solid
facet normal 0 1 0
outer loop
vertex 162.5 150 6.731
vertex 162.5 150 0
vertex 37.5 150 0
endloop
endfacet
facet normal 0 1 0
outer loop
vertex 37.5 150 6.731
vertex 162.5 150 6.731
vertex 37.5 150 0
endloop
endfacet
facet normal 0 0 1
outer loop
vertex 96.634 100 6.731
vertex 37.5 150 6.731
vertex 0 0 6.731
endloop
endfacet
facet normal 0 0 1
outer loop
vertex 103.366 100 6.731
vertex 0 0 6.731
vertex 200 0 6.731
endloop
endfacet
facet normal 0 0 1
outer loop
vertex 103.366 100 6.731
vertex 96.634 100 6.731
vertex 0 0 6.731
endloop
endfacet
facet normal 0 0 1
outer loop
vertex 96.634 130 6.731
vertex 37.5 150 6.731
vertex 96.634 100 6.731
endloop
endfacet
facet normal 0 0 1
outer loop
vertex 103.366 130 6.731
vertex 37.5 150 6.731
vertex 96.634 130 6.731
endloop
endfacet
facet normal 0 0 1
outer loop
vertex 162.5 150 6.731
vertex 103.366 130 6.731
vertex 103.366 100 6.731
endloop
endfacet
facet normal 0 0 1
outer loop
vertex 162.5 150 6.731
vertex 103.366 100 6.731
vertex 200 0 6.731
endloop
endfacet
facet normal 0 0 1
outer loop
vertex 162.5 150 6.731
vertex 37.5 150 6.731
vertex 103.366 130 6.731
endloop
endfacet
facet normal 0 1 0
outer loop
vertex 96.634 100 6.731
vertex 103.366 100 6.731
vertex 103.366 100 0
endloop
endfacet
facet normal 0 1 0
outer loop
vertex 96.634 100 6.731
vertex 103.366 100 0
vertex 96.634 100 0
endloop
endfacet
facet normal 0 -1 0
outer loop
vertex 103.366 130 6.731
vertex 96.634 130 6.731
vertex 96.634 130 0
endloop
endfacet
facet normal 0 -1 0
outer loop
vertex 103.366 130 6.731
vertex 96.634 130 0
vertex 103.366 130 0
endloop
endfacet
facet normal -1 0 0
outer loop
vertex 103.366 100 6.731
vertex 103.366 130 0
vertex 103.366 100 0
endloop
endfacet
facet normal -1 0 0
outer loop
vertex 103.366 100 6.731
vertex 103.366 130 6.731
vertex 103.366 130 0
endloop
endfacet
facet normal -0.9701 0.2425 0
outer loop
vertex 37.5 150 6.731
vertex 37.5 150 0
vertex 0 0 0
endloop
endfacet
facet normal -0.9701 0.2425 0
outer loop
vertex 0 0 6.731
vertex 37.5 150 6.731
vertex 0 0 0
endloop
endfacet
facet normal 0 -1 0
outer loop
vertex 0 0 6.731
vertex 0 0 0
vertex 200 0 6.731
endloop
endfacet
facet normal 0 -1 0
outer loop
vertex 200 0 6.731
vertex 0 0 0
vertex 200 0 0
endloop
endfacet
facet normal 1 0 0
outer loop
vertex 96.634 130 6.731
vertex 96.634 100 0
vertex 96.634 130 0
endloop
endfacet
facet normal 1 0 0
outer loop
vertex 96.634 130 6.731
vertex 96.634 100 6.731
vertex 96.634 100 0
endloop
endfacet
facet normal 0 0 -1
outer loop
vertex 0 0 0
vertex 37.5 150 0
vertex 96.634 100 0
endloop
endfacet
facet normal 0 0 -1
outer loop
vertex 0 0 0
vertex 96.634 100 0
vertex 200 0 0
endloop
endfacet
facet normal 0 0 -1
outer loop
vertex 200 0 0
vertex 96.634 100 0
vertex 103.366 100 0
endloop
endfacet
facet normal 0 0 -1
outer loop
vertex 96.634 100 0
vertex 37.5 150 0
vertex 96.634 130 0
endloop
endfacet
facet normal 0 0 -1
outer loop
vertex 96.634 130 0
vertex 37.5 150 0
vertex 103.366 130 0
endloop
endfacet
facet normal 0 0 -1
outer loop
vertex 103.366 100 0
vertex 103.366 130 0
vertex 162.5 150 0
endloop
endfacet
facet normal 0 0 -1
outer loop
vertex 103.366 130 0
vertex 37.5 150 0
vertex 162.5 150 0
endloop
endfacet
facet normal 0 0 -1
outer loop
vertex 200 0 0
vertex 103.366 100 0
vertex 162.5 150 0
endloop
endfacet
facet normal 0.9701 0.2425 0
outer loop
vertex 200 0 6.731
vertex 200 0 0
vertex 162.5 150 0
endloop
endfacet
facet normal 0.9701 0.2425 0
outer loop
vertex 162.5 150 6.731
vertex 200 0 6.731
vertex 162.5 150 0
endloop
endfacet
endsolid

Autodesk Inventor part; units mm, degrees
ref_plane "YZ Plane" through (0, 0, 0) normal (1, 0, 0) x (0, 1, 0)
ref_plane "XZ Plane" through (0, 0, 0) normal (0, 1, 0) x (-1, 0, 0)
ref_plane "XY Plane" through (0, 0, 0) normal (0, 0, 1) x (1, 0, 0)
sketch "Sketch1" plane through (0, 0, 0) normal (0, 0, 1) x (1, 0, 0)
  line L0 (0, 0) -> (200, 0)
  line L1 (200, 0) -> (162.5, 150)
  line L2 (162.5, 150) -> (37.5, 150)
  line L3 (37.5, 150) -> (0, 0)
  dimension "d0" = 150
  dimension "d1" = 200
  dimension "d2" = 125
extrude "Extrusion1" add sketch "Sketch1" along normal blind 6.731
sketch "Sketch2" plane through (0, 0, 6.731) normal (0, 0, 1) x (1, 0, 0)
  line L0 (0, 0) -> (200, 0) projected
  line L1 (162.5, 150) -> (37.5, 150) projected
  line L2 (96.6345, 130) -> (103.3655, 130)
  line L3 (103.3655, 130) -> (103.3655, 100)
  line L4 (103.3655, 100) -> (96.6345, 100)
  line L5 (96.6345, 100) -> (96.6345, 130)
  point P0 (100, 130)
  point P1 (100, 150)
  dimension "d5" = 30
  dimension "d6" = 100
  dimension "d7" = 6.731
extrude "Extrusion2" cut sketch "Sketch2" against normal up to next
equation "\"d3\" = THICKB"
equation "\"d7\" = THICKB"
equation "\"THICKA\" = 3.175"
equation "\"THICKB\" = 6.731"
equation "\"THICKC\" = 12.7"
equation "\"THICKPLY\" = 5"
equation "\"MAGDIA\" = 9.5"
equation "\"BALLDIA\" = 12"
properties part number "Side"
